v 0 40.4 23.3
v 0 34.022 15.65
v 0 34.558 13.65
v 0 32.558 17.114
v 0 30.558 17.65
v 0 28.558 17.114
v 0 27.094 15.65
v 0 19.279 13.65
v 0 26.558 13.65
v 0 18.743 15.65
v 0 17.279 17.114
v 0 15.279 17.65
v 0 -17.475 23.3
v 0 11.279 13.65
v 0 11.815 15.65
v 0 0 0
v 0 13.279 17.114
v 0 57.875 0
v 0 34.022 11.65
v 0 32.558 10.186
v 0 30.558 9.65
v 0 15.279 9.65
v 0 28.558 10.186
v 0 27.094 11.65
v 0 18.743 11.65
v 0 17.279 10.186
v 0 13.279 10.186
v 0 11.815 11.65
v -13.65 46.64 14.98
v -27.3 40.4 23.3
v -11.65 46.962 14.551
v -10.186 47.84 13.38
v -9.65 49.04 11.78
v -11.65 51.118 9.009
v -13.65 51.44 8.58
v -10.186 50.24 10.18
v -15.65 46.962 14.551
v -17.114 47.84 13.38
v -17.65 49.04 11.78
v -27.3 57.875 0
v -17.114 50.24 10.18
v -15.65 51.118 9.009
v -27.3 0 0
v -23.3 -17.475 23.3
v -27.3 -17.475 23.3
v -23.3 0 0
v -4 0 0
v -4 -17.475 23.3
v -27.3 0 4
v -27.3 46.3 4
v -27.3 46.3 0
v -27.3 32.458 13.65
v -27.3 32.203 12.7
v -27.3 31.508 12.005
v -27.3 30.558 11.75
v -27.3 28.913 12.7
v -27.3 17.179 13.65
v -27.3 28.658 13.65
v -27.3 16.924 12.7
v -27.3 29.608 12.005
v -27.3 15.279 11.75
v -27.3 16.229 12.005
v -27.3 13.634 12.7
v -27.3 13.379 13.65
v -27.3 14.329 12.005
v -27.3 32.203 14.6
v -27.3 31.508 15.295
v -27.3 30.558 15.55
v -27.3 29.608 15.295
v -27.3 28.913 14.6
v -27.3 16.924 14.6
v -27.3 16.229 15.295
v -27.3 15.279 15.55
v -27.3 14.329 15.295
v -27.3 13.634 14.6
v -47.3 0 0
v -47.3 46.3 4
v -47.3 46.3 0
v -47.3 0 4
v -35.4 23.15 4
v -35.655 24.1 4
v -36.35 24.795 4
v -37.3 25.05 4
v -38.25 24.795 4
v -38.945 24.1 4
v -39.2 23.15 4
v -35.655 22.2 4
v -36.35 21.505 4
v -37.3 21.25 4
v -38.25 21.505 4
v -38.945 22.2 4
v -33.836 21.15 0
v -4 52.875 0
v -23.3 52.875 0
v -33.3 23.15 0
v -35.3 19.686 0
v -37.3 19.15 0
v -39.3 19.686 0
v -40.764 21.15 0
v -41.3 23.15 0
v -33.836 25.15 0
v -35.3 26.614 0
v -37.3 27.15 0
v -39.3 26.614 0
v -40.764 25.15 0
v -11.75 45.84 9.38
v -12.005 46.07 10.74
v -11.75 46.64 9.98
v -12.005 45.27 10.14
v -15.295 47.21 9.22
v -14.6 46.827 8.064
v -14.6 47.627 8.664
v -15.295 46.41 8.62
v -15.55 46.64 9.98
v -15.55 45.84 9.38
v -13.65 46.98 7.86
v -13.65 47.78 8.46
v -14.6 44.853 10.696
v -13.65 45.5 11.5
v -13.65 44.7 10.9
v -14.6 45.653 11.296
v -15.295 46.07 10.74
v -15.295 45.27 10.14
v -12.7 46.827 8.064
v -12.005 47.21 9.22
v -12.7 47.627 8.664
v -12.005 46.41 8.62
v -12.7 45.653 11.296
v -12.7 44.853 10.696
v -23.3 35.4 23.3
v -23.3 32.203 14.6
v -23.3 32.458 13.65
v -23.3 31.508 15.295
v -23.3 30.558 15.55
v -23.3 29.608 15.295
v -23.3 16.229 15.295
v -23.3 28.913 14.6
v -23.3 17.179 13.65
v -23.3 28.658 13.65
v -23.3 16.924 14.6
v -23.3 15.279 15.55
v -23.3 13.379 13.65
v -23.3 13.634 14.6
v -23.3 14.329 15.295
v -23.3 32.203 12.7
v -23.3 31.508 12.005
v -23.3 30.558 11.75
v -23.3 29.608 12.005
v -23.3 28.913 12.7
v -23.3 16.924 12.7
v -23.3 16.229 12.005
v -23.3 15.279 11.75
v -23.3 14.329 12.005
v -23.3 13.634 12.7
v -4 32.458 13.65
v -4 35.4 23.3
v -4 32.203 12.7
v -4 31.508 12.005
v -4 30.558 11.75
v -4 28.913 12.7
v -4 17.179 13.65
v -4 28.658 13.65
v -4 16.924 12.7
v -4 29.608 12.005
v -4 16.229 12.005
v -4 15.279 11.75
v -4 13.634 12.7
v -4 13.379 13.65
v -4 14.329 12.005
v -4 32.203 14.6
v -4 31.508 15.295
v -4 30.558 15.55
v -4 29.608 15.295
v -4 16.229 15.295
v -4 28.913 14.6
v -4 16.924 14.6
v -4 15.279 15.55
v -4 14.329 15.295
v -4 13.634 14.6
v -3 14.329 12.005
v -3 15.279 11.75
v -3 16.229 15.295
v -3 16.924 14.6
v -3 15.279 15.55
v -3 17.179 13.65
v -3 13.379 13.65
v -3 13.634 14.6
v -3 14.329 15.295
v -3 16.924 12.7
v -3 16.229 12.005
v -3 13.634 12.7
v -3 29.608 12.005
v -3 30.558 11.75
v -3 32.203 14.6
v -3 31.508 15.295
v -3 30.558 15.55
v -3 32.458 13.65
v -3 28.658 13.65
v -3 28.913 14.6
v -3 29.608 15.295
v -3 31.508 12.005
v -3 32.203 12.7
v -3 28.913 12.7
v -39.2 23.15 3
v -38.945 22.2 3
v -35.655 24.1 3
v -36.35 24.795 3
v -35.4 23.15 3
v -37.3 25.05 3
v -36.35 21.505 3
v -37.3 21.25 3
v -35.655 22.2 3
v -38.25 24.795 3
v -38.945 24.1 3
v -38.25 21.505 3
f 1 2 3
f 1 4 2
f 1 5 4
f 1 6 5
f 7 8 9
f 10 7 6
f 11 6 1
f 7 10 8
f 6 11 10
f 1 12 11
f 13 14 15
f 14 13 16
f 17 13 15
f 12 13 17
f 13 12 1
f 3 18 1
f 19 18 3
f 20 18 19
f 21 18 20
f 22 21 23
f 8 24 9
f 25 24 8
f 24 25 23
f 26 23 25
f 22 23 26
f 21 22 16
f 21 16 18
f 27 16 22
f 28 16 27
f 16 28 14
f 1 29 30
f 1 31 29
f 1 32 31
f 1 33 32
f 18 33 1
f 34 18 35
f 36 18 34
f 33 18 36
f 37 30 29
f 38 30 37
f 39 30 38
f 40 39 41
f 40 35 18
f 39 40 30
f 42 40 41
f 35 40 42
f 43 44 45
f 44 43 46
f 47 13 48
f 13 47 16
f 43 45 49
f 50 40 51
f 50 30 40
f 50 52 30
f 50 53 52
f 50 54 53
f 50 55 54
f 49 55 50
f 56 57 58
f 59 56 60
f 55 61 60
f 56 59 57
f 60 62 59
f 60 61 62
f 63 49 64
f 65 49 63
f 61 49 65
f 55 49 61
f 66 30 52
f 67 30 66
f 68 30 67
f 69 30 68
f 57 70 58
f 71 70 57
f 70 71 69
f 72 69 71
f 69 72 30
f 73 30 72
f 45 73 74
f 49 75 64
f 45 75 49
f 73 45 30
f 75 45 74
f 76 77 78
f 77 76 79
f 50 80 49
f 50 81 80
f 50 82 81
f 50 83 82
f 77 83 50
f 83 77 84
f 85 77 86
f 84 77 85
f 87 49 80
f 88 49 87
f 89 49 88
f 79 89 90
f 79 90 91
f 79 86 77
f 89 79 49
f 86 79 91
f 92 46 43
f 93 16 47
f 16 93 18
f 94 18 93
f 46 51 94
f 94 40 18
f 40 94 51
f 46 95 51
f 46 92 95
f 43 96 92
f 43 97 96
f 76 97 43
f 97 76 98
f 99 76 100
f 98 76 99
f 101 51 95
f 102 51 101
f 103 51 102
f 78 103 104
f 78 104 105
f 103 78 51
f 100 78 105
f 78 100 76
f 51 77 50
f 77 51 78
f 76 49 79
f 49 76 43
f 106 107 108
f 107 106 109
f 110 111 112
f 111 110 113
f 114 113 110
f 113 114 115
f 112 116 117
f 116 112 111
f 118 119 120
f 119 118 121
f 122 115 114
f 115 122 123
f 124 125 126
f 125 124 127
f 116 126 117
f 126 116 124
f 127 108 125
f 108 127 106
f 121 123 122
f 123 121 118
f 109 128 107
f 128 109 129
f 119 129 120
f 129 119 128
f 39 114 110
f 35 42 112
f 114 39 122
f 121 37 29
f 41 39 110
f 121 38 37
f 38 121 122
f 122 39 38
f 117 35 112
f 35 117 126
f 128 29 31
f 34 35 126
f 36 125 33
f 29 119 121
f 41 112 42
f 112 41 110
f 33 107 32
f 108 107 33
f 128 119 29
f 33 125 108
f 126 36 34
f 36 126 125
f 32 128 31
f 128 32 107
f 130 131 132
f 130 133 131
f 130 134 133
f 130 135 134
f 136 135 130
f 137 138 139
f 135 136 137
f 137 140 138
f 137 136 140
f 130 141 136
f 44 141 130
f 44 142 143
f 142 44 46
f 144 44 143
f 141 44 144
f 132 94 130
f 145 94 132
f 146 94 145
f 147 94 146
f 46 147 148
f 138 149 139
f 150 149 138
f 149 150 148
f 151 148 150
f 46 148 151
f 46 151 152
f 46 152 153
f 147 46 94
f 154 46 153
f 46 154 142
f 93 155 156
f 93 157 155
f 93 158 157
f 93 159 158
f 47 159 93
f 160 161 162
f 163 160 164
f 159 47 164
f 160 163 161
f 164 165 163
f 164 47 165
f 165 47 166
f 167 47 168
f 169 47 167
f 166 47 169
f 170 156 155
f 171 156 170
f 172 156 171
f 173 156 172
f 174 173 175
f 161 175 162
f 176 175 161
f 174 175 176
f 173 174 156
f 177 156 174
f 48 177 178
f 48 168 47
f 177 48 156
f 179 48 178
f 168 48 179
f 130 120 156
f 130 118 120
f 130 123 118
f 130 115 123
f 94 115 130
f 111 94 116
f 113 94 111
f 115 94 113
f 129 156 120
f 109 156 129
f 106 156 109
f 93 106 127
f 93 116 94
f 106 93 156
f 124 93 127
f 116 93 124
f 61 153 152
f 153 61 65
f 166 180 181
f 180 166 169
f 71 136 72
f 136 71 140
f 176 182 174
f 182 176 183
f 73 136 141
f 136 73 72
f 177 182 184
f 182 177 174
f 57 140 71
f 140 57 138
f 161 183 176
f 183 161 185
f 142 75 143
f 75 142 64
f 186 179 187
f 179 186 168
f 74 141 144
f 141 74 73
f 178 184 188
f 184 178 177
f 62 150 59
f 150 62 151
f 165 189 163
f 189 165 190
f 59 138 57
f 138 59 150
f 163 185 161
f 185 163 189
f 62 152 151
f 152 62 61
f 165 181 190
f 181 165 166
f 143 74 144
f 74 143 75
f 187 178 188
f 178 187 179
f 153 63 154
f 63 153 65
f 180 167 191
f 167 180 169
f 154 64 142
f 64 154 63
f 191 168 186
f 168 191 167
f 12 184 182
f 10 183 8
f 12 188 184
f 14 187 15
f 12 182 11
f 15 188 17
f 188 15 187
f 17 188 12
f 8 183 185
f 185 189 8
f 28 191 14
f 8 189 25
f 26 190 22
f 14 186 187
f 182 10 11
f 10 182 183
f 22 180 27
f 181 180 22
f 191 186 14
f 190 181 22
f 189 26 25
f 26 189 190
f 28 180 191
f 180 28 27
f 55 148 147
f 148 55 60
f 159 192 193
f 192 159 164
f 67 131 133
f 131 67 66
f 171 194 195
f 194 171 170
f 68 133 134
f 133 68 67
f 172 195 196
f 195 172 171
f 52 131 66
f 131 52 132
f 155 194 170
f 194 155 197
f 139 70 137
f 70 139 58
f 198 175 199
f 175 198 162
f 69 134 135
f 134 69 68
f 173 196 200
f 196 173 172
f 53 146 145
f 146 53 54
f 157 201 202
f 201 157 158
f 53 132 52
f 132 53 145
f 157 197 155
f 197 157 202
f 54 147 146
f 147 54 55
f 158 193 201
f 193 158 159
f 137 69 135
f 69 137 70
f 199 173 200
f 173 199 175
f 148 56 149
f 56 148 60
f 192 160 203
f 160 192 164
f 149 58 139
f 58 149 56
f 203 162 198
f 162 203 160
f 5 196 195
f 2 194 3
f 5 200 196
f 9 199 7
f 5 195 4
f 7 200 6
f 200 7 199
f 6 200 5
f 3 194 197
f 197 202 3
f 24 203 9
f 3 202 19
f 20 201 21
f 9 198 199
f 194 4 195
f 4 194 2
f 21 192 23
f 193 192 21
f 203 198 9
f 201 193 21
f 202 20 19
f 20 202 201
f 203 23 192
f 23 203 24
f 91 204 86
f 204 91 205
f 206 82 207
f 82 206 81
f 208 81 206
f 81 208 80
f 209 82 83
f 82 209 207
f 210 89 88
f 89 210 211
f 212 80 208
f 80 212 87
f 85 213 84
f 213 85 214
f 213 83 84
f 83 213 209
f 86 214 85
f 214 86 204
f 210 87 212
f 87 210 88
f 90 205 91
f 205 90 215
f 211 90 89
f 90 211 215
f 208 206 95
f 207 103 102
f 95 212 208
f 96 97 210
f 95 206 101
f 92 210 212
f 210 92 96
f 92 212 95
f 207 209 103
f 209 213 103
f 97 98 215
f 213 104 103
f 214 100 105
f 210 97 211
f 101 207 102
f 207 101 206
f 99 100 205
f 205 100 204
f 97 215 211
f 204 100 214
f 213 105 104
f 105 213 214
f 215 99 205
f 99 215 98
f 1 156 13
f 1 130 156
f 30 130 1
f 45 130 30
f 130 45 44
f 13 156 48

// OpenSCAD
difference(){
	scale(v = [-1, 1, 1]) {
		union() {
			translate(v = [0, 0, 0]) {
				rotate(a = 36.8700000000, v = [1, 0, 0]) {
					translate(v = [0, 0, -50]) {
						cube(size = [27.3000000000, 46.3000000000, 100]);
					}
				}
			}
			translate(v = [27.3000000000, 0, 0]) {
				cube(size = [20, 46.3000000000, 4]);
			}
		}
	}
	/* Holes Below*/
	scale(v = [-1, 1, 1]){
		union(){
			translate(v = [0, 0, 0]){
				rotate(a = 36.8700000000, v = [1, 0, 0]){
					translate(v = [0, 0, -50]){
						translate(v = [4, -1, 0]) {
							cube(size = [19.3000000000, 43.3000000000, 100]);
						}
					}
					translate(v = [13.6500000000, 46.3000000000, -20]) {
						rotate(a = -90, v = [1, 0, 0]) {
							union() {
								union() {
									translate(v = [0, 0, -5]) {
										cylinder($fn = 12, h = 5, r = 1.9000000000);
									}
									translate(v = [0, 0, -3]) {
										cylinder($fn = 12, h = 3, r1 = 1.9000000000, r2 = 4);
									}
								}
								cylinder($fn = 12, h = 1, r = 4);
							}
						}
					}
				}
			}
			translate(v = [0, 15.2790000000, 13.6500000000]) {
				rotate(a = -90, v = [0, 1, 0]) {
					union() {
						union() {
							translate(v = [0, 0, -28.3000000000]) {
								cylinder($fn = 12, h = 28.3000000000, r = 1.9000000000);
							}
							translate(v = [0, 0, -3]) {
								cylinder($fn = 12, h = 3, r1 = 1.9000000000, r2 = 4);
							}
						}
						cylinder($fn = 12, h = 1, r = 4);
					}
				}
			}
			translate(v = [0, 30.5580000000, 13.6500000000]) {
				rotate(a = -90, v = [0, 1, 0]) {
					union() {
						union() {
							translate(v = [0, 0, -28.3000000000]) {
								cylinder($fn = 12, h = 28.3000000000, r = 1.9000000000);
							}
							translate(v = [0, 0, -3]) {
								cylinder($fn = 12, h = 3, r1 = 1.9000000000, r2 = 4);
							}
						}
						cylinder($fn = 12, h = 1, r = 4);
					}
				}
			}
			translate(v = [37.3000000000, 23.1500000000, 0]) {
				rotate(a = 180, v = [0, 1, 0]) {
					union() {
						union() {
							translate(v = [0, 0, -5]) {
								cylinder($fn = 12, h = 5, r = 1.9000000000);
							}
							translate(v = [0, 0, -3]) {
								cylinder($fn = 12, h = 3, r1 = 1.9000000000, r2 = 4);
							}
						}
						cylinder($fn = 12, h = 1, r = 4);
					}
				}
			}
			translate(v = [-100, -100, -100]) {
				cube(size = [200, 200, 100]);
			}
			translate(v = [-100, -100, 23.3000000000]) {
				cube(size = [200, 200, 100]);
			}
		}
	} /* End Holes */ 
}
